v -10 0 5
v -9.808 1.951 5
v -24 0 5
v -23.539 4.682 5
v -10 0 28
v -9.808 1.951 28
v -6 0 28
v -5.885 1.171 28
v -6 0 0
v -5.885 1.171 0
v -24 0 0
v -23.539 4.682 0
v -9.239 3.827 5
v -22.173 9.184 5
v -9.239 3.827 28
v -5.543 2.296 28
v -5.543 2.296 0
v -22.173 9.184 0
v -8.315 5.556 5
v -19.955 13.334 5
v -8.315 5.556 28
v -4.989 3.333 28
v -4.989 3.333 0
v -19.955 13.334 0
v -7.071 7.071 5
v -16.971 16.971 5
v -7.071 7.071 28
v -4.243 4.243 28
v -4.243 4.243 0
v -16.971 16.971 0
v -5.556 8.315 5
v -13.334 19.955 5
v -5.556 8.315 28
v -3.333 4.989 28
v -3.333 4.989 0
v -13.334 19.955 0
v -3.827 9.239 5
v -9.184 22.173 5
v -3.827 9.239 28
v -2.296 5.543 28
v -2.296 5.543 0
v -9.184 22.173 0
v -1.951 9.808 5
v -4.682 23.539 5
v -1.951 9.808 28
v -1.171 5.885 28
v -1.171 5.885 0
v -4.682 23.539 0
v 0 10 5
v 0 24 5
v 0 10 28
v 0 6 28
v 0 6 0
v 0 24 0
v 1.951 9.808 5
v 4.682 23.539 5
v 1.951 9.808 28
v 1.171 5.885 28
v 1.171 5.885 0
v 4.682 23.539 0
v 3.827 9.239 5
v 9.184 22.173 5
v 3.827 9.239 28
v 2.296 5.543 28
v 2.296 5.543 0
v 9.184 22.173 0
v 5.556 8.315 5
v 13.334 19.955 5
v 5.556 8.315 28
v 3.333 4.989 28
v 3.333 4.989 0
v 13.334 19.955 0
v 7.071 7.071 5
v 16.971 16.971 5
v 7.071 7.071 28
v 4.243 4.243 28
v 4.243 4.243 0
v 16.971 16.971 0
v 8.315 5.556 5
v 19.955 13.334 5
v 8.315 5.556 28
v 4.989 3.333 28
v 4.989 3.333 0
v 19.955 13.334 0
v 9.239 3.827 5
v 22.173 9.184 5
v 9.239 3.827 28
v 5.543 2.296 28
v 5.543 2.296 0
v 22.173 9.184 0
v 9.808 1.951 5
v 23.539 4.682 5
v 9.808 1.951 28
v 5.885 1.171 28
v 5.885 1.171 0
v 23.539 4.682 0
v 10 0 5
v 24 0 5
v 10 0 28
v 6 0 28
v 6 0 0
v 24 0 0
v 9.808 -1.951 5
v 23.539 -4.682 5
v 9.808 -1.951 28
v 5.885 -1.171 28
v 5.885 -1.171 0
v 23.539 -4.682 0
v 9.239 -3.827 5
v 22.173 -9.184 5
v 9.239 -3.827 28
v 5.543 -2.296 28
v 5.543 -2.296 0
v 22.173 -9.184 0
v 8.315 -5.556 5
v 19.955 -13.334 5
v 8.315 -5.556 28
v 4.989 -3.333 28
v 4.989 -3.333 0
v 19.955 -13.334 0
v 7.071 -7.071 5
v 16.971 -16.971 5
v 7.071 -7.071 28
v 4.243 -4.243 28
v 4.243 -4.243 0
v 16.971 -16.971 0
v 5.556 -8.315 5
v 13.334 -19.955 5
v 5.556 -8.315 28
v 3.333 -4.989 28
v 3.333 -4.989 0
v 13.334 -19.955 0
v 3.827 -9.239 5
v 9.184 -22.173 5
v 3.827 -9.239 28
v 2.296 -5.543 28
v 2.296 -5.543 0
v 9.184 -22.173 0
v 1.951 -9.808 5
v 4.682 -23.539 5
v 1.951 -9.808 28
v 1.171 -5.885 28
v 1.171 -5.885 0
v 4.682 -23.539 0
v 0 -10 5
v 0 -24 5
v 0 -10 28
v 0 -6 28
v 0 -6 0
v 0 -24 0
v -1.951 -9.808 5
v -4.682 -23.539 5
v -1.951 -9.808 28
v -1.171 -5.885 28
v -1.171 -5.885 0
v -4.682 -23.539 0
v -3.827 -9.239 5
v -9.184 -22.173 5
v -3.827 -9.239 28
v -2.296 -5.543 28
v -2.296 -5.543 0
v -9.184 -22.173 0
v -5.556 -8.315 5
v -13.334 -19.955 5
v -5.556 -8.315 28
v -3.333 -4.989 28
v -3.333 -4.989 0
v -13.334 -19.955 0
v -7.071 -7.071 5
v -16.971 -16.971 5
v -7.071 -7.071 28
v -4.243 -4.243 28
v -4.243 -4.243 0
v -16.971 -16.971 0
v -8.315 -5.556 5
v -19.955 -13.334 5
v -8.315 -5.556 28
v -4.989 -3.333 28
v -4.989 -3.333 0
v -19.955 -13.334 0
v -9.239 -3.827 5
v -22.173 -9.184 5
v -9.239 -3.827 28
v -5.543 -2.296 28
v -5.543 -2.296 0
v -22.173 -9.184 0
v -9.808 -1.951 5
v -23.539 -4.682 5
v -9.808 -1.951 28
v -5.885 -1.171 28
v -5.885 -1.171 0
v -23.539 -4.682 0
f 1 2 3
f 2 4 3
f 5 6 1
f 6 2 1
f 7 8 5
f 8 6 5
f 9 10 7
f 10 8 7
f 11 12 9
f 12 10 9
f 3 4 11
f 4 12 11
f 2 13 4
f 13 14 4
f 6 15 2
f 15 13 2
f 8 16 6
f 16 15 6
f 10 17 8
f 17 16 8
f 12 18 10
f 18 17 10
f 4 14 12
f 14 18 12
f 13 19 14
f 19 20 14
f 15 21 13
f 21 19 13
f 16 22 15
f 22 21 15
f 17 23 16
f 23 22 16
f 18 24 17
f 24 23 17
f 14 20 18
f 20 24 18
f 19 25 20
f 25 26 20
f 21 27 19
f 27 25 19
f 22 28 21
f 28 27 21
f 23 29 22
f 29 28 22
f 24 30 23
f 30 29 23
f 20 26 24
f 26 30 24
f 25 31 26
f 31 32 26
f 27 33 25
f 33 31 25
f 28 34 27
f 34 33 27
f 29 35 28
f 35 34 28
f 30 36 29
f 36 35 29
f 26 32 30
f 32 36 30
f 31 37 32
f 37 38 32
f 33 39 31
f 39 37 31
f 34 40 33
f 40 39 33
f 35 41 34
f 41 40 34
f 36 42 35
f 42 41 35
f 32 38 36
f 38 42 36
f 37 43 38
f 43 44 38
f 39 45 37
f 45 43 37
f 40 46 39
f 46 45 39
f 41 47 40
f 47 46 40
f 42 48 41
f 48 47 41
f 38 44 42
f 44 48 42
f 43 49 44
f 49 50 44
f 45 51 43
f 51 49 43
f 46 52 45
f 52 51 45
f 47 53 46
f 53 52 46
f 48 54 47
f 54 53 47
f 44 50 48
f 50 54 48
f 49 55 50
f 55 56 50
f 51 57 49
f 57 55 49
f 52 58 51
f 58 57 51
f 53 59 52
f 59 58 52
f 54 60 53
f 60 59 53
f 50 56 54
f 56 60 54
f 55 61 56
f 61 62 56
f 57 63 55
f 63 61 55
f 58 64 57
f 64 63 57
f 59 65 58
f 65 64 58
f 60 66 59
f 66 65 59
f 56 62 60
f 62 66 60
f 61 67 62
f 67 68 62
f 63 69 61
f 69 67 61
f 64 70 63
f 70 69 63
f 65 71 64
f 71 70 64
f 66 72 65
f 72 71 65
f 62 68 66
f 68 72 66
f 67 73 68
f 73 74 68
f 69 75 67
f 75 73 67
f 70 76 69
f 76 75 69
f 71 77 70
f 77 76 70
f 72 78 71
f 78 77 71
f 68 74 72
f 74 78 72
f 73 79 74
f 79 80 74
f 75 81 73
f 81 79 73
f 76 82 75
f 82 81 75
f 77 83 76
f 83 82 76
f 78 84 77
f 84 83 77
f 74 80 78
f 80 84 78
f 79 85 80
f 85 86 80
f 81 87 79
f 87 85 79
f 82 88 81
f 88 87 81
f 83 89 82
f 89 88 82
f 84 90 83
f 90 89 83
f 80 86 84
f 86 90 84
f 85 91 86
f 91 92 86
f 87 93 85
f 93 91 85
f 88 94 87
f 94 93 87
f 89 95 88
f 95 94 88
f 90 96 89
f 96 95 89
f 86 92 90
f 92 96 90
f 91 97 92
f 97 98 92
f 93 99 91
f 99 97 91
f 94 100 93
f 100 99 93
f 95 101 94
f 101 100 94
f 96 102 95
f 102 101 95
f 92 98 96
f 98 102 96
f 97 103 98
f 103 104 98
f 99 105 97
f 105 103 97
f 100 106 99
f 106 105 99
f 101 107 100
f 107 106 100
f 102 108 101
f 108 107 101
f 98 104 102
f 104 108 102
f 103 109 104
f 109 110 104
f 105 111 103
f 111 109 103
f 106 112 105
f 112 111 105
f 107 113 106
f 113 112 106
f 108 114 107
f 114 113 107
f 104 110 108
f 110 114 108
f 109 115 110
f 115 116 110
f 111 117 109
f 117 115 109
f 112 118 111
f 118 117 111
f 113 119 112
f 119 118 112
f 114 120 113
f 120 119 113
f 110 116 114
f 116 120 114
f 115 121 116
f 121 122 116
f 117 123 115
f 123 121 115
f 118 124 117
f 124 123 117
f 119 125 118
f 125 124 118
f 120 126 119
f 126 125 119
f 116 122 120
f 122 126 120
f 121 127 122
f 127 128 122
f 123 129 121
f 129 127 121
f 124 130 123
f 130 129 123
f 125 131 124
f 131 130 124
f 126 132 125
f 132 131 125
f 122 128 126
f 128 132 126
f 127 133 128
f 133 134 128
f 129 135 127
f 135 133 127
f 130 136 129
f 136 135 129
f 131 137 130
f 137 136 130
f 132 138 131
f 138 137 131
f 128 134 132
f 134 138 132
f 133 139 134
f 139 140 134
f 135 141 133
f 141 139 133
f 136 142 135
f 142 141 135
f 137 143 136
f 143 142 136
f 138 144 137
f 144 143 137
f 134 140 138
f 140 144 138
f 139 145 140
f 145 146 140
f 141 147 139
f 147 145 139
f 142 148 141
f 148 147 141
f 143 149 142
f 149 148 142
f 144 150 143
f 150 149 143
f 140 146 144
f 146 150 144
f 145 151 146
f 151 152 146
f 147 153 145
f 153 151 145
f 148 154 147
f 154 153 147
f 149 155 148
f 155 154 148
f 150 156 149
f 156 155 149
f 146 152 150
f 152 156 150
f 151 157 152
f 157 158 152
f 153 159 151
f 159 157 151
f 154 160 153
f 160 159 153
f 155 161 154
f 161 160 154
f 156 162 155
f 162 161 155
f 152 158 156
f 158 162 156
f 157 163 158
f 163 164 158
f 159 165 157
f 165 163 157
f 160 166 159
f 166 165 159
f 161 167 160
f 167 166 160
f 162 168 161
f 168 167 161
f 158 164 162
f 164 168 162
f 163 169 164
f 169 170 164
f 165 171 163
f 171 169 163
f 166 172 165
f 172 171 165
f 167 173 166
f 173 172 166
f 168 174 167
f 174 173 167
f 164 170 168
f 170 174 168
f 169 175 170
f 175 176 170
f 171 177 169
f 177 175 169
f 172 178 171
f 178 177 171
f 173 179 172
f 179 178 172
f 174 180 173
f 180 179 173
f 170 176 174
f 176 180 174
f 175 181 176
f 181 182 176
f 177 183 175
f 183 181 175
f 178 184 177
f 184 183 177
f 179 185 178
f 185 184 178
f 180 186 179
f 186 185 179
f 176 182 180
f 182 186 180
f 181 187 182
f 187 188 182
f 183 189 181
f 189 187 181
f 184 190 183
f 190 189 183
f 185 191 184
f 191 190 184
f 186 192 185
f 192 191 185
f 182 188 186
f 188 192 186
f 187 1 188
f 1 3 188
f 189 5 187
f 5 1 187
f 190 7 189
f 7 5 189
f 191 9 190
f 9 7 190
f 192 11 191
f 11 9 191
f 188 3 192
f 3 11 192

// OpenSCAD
$fn = 32;

// ----------------------------------------------------------------------
// Revolved part: flanged bushing R24
// ----------------------------------------------------------------------

// --- parameters (mm) ---
bore_r = 6;               // bore radius
flange_r = 24;            // flange radius
flange_h = 5;             // flange thickness
sleeve_r = 10;            // sleeve radius
total_h = 28;             // overall height
revolve_angle = 360;      // revolve sweep, degrees

bore_d = 2 * bore_r;
flange_d = 2 * flange_r;
sleeve_d = 2 * sleeve_r;

profile = [[6, 0], [24, 0], [24, 5], [10, 5], [10, 28], [6, 28]];  // primary outline, 6 points, counter clockwise

// --- the one profile operation ---
rotate_extrude(angle = revolve_angle) polygon(points = profile);
